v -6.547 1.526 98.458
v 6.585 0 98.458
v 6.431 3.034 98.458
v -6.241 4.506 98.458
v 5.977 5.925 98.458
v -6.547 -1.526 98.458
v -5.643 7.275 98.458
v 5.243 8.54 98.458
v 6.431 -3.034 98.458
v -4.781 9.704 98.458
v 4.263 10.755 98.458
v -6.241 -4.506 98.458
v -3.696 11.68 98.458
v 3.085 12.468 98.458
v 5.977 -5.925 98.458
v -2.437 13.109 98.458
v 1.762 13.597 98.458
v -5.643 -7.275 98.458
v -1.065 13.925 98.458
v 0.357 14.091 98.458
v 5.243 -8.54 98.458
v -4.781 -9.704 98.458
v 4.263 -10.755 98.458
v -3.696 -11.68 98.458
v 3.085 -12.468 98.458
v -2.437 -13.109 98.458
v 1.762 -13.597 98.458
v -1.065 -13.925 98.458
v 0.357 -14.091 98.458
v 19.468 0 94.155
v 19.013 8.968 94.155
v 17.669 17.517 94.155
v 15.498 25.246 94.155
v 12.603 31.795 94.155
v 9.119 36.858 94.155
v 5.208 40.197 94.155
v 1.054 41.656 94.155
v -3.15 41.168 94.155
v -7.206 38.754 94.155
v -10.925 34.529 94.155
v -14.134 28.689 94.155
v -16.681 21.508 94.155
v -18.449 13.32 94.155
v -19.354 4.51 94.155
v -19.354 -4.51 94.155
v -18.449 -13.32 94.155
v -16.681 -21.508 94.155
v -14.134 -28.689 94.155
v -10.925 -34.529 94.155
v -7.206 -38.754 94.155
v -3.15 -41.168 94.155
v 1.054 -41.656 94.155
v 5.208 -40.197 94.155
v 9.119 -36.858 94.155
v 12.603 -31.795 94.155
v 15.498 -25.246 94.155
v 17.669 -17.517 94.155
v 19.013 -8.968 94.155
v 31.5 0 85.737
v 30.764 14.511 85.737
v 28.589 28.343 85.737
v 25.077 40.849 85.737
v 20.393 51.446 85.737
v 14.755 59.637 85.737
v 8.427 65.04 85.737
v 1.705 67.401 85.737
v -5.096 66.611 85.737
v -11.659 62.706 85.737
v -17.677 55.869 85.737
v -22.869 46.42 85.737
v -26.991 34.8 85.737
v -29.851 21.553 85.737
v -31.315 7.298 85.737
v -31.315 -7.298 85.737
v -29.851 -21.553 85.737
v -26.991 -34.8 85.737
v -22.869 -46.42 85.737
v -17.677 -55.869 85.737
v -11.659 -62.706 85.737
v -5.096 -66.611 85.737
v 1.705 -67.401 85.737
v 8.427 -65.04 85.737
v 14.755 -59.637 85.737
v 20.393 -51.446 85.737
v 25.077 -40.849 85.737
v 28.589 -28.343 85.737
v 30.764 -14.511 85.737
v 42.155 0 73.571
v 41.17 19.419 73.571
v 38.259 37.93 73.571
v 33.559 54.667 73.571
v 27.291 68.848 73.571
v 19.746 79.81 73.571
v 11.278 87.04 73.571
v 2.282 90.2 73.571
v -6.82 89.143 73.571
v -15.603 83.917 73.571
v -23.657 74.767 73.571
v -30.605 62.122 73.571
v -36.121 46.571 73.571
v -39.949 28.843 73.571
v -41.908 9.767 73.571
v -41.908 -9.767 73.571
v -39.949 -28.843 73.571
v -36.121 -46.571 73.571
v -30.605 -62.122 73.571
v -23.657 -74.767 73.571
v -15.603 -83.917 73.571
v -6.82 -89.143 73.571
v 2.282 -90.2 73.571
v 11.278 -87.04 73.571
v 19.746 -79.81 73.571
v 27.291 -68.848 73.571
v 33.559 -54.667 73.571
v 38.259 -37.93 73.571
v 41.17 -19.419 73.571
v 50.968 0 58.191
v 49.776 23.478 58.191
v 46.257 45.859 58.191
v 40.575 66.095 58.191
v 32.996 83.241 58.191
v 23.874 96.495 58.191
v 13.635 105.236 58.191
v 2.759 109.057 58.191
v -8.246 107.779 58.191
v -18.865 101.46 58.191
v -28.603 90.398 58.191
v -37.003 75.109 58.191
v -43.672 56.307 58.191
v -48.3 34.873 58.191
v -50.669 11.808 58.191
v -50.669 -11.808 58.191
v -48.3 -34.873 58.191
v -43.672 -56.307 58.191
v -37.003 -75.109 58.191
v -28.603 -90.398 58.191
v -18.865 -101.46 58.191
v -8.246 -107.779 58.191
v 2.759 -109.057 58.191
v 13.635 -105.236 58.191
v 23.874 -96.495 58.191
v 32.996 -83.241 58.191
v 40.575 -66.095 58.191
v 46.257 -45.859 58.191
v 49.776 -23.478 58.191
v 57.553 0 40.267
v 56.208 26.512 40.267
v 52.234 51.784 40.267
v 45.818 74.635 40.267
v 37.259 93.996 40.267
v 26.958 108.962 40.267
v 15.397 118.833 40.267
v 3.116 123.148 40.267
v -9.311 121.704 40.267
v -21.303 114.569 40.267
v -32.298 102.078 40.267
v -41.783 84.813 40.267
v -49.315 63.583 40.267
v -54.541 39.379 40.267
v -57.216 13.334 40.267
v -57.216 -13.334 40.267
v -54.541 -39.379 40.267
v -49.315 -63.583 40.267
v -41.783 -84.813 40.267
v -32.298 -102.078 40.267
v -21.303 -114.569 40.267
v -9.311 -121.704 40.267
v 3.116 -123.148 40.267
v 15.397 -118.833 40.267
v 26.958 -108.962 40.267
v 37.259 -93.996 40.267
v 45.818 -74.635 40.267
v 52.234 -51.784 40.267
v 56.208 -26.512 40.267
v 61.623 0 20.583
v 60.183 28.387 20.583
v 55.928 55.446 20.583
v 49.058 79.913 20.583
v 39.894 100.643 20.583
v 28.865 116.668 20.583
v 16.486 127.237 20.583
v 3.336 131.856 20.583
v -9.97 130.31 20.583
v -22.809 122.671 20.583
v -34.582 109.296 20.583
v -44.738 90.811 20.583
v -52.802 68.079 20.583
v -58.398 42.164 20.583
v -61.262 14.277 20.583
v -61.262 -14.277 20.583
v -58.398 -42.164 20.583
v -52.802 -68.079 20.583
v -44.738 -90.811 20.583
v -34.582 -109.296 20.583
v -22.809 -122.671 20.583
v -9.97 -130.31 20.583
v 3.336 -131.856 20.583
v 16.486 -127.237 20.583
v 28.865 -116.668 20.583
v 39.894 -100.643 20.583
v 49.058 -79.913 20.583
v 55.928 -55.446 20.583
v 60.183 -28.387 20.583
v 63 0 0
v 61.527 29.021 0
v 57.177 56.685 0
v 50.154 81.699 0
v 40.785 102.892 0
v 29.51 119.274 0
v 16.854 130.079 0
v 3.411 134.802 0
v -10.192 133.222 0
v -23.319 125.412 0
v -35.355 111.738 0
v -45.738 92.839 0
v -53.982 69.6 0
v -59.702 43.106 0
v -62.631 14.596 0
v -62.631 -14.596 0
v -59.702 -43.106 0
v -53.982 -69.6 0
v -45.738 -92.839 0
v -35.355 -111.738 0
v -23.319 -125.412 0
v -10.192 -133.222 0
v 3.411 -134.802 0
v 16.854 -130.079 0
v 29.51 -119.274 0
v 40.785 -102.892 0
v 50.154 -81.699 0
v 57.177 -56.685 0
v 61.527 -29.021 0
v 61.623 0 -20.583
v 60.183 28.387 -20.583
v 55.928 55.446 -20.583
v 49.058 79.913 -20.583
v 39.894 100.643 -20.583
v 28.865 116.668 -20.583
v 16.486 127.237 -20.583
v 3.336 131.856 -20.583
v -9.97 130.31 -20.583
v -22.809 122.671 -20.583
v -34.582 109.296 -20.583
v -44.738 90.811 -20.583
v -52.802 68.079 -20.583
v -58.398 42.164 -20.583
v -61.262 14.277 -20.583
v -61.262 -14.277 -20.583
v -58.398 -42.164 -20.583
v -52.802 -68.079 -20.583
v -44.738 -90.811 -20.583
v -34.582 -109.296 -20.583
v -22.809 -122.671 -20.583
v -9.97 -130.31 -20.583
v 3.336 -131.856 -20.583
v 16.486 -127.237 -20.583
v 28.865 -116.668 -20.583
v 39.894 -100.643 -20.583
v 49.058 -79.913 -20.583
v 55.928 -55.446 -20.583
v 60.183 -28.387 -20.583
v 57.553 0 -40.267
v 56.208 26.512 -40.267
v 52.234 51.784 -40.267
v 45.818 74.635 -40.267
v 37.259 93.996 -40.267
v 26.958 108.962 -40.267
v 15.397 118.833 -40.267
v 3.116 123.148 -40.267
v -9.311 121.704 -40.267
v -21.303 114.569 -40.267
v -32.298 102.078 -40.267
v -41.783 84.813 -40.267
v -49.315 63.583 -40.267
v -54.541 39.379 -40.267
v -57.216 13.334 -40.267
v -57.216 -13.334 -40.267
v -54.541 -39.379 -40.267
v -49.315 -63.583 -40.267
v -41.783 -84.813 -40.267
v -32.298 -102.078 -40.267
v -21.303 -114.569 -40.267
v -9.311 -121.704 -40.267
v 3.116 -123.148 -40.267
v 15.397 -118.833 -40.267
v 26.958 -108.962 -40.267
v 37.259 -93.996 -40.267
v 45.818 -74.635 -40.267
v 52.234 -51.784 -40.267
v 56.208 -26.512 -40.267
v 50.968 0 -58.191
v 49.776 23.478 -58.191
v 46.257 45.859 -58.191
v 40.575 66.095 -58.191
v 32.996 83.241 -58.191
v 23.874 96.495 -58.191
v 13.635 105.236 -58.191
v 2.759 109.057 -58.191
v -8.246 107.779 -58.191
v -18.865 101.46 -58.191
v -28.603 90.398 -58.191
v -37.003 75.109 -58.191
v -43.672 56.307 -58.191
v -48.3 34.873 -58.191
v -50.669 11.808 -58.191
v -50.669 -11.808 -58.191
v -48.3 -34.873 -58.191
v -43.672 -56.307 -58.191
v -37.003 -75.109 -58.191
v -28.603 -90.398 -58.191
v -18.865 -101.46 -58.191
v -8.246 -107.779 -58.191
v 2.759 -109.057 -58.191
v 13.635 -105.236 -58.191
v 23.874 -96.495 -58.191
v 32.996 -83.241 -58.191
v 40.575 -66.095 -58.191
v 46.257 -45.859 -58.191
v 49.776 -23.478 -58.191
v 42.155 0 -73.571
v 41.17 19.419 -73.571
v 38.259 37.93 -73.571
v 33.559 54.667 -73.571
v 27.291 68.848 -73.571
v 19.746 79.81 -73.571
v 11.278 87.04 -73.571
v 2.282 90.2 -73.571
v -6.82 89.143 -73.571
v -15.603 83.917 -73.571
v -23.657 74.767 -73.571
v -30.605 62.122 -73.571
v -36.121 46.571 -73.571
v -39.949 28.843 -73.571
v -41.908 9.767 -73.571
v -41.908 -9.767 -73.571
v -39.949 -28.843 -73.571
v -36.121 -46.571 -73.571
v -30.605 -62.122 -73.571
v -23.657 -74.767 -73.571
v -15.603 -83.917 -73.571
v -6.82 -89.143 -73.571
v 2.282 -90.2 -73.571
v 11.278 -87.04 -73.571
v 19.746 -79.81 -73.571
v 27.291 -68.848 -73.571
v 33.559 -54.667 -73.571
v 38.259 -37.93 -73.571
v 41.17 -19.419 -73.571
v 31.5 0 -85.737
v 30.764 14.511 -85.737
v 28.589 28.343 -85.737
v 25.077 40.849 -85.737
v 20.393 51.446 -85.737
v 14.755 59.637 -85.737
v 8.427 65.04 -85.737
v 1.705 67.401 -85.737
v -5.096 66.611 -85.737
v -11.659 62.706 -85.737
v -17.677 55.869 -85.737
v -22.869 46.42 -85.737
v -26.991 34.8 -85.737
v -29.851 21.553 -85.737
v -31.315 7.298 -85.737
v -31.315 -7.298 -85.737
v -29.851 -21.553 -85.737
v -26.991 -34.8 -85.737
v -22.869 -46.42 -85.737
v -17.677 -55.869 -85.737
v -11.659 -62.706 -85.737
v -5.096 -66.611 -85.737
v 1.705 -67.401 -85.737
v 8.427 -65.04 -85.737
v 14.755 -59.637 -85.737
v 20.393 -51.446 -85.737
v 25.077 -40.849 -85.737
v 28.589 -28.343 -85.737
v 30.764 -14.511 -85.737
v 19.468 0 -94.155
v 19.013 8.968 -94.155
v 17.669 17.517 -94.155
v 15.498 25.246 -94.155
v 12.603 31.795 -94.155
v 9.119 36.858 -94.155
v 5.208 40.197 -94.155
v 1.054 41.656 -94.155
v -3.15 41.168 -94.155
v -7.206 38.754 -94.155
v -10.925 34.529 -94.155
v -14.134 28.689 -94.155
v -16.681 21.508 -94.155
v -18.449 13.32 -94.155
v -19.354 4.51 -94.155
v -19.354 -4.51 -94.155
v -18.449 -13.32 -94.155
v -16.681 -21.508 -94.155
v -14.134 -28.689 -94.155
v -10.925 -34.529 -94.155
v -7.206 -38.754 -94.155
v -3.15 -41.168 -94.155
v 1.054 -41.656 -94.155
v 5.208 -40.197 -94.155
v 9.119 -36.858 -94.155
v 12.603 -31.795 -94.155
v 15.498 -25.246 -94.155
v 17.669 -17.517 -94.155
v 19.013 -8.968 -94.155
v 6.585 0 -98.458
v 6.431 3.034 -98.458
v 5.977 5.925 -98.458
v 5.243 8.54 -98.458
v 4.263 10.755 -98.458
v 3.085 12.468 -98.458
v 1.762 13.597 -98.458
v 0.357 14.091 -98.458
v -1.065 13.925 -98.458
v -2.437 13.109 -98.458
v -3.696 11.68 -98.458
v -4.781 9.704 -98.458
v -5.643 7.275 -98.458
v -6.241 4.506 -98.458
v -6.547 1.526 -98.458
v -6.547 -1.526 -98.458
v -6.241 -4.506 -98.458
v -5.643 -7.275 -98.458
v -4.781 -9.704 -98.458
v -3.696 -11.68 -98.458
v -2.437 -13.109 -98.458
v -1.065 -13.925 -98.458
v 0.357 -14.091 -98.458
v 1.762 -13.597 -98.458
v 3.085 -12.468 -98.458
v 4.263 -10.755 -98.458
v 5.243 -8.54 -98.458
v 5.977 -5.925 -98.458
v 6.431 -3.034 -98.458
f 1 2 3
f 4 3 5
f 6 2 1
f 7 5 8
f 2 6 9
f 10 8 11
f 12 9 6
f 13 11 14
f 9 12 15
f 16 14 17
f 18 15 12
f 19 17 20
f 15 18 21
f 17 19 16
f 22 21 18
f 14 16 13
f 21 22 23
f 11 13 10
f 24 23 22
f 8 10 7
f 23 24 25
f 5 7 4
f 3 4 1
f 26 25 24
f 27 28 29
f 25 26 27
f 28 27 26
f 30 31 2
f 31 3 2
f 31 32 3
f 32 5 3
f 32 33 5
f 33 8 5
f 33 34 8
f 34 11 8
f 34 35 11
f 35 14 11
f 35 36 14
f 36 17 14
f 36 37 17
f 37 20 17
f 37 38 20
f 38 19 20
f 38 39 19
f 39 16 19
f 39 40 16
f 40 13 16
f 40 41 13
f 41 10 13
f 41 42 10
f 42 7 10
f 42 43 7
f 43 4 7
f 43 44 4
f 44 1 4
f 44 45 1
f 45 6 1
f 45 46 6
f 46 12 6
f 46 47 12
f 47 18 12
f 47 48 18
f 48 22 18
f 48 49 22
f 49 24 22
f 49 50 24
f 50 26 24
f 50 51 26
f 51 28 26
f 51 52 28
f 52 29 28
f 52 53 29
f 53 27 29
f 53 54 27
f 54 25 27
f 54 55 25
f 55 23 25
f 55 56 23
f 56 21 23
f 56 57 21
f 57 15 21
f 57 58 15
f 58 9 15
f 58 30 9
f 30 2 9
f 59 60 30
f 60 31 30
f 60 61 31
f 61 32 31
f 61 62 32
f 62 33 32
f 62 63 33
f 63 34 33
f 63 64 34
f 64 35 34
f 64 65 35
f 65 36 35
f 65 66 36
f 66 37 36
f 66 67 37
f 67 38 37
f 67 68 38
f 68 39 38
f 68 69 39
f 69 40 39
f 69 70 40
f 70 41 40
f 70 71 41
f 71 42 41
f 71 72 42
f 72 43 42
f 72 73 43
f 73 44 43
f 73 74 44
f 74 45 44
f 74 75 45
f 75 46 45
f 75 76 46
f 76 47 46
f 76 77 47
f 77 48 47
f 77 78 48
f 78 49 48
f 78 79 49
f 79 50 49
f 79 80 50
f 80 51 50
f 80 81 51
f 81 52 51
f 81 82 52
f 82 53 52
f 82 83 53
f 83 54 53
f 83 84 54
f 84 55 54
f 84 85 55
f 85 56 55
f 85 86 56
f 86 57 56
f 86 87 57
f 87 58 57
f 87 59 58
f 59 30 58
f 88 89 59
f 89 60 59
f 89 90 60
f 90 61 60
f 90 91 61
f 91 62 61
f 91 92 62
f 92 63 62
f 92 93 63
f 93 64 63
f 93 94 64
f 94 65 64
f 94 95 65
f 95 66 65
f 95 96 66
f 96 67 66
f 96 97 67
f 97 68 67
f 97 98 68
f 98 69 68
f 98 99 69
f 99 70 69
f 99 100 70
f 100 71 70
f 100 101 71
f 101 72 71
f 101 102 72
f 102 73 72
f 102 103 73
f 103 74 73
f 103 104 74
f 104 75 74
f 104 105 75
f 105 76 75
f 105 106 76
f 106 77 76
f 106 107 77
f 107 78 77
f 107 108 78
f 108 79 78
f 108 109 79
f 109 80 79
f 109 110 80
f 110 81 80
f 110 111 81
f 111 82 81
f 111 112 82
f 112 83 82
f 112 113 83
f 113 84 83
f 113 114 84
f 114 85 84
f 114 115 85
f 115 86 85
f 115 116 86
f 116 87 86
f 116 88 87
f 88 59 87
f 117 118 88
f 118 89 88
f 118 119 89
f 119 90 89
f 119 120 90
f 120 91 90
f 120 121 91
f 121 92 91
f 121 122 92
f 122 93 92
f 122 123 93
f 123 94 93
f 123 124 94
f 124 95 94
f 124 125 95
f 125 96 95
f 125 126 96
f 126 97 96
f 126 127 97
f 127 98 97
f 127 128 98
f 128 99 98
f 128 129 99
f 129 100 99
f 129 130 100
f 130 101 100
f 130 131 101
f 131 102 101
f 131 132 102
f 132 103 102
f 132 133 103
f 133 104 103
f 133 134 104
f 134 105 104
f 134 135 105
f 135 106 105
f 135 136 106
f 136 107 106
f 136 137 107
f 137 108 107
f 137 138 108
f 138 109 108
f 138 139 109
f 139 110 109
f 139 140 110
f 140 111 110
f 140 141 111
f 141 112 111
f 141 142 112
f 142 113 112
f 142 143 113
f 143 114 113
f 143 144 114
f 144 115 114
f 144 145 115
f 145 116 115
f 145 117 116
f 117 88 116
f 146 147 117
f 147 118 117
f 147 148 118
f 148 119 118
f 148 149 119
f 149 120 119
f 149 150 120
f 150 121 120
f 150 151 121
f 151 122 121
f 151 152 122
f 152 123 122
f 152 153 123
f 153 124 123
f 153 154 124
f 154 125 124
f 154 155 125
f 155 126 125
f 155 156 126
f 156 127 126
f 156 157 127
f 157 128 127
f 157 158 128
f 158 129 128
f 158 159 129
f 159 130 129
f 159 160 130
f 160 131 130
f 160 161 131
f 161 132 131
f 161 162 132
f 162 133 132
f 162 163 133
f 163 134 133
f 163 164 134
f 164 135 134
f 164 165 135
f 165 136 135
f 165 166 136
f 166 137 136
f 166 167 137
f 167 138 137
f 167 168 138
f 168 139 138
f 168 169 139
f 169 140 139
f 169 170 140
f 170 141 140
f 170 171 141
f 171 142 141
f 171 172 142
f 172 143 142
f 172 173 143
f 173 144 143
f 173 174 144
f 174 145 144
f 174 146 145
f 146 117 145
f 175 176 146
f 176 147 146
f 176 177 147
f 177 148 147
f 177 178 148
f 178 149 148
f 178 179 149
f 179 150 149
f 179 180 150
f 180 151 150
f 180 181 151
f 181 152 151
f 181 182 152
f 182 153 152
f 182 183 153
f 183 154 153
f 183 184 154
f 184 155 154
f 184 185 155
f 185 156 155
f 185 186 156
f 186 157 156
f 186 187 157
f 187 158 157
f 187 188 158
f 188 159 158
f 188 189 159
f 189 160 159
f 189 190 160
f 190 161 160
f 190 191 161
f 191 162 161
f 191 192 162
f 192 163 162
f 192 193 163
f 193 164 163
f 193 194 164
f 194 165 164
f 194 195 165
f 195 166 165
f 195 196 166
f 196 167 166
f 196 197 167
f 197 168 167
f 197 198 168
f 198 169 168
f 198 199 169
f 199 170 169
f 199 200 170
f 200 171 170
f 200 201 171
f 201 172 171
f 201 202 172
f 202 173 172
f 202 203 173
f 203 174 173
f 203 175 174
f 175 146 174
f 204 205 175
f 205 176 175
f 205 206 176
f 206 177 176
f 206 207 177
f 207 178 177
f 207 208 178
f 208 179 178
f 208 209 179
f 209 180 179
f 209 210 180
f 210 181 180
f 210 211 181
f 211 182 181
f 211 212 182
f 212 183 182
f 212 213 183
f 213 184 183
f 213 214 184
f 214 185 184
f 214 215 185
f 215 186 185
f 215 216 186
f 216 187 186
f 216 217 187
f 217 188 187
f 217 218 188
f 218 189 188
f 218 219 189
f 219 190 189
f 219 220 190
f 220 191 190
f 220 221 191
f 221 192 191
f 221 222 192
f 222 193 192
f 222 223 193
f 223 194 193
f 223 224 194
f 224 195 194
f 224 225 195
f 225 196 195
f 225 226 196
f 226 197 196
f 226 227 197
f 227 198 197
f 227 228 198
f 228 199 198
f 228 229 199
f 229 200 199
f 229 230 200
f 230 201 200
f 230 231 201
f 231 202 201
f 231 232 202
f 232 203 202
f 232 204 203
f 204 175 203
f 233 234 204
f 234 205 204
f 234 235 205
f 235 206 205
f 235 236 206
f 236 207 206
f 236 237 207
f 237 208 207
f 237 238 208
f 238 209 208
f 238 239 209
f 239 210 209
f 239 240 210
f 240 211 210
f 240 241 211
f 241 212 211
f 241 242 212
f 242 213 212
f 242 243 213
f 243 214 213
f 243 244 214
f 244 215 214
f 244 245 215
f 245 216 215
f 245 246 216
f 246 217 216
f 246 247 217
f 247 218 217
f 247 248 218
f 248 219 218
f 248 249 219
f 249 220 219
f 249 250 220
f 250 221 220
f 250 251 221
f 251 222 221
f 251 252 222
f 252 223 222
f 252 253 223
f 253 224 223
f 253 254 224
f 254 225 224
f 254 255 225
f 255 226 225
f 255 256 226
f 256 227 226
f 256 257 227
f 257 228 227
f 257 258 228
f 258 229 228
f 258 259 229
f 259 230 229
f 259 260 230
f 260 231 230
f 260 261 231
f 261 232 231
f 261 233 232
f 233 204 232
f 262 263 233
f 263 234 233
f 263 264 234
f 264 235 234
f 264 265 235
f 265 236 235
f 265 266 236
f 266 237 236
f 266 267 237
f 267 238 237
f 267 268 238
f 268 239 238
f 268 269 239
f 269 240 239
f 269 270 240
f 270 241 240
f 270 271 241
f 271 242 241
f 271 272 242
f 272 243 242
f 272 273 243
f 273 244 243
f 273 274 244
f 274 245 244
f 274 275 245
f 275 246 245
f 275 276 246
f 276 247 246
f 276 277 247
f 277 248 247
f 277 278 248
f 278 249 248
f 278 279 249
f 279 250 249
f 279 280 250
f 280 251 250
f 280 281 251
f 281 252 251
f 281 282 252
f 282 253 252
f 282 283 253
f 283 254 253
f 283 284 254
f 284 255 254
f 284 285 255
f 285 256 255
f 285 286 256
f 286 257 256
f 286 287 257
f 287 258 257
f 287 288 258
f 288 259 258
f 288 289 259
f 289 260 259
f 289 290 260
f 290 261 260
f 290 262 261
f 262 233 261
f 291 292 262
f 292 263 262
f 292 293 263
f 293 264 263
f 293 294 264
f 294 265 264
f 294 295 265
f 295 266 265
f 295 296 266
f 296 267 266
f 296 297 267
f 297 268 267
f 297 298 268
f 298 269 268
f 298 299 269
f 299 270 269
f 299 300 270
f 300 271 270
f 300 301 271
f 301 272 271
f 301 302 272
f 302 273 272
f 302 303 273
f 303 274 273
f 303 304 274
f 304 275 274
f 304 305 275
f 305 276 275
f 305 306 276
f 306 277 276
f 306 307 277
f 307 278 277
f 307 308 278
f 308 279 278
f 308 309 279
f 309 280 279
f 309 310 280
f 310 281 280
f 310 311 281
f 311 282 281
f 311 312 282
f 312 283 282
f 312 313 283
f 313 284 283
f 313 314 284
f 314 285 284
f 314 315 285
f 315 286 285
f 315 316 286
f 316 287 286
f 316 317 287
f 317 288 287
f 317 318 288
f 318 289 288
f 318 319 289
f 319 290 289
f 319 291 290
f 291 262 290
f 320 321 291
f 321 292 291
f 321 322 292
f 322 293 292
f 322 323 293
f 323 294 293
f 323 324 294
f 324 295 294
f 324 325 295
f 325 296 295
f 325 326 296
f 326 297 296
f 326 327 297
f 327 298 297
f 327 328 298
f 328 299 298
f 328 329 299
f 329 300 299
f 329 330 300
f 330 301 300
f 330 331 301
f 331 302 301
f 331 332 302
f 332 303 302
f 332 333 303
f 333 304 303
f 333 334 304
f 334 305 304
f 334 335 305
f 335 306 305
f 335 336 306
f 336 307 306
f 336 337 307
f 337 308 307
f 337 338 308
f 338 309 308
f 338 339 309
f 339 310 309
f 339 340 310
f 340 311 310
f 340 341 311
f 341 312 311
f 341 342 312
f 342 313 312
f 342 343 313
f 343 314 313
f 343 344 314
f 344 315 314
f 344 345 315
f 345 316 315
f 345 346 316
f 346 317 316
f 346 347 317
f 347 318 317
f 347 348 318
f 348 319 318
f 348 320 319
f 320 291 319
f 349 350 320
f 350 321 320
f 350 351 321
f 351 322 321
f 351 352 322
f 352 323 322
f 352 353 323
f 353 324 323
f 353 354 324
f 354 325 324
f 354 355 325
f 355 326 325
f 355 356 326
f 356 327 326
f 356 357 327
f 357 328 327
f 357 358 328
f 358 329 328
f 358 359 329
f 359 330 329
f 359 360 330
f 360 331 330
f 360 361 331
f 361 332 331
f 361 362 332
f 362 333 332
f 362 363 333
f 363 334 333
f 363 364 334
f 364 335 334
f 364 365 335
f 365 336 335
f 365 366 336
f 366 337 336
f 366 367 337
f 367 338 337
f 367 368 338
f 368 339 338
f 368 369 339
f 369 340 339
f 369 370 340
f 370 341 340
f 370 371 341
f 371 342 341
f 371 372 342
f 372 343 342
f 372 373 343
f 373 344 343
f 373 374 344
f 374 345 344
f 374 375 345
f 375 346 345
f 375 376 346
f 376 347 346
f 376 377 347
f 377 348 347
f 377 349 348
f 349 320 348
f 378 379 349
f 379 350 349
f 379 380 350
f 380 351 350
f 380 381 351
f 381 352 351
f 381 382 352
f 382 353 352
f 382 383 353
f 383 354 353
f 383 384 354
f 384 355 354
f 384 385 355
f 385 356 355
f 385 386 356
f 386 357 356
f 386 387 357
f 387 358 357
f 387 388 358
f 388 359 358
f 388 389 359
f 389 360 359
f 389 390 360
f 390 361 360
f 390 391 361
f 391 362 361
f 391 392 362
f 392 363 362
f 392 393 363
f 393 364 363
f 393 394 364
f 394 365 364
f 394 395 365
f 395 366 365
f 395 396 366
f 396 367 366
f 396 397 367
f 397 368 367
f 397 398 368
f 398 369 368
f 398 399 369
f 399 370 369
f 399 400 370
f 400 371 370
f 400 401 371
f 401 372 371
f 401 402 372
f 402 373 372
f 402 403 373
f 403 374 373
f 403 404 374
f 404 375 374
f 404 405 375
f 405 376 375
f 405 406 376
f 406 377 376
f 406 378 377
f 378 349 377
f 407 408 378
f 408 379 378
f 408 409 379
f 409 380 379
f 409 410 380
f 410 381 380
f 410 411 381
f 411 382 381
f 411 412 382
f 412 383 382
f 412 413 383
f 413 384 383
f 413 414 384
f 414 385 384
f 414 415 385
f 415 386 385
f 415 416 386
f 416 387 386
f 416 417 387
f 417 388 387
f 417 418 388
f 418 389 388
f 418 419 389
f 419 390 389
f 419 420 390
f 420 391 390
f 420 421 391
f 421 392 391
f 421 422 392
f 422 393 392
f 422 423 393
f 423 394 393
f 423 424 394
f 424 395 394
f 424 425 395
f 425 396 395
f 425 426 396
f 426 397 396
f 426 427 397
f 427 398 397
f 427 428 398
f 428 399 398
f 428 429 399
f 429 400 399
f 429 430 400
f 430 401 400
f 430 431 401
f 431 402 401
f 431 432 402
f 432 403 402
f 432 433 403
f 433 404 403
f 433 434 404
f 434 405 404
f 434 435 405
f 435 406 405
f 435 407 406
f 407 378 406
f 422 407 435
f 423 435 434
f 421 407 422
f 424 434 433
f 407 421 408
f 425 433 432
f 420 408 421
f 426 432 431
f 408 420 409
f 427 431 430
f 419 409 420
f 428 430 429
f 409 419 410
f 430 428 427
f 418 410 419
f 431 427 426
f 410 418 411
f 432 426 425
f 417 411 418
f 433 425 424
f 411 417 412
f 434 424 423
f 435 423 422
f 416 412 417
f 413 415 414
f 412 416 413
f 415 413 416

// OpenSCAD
// Generated by SolidPython 1.0.1 on 2020-07-29 00:46:48


scale(v = [7, 15, 11]) {
	sphere(r = 9);
}
/***********************************************
*********      SolidPython code:      **********
************************************************
 
# import packages: SolidPython
from solid import *
from solid.utils import *
from itertools import chain, combinations, permutations


class Resize:

    def __init__(self, scad_file):
        self.scad_file = scad_file
        #self.scad_file = import_scad(scad_file)
        # cone/cylinder param:
        self.r1 = 0
        self.r2 = 0
        self.h = 0
        # rectangular prism param:
        self.w = 0
        self.l = 0
        # ellipse param:
        self.r = 0

    # import OpenScad code (file name corresponds to shape)


    # classify shape + parameters
    def assign(self, param1, param2, param3):
        if self.scad_file == 'cone.scad':
            self.r1 = param1
            self.r2 = param2
            self.h = param3
        elif self.scad_file == 'cylinder.scad':
            self.r1 = param1
            self.r2 = param2
            self.h = param3
        elif self.scad_file == 'rectangularPrism.scad':
            self.h = param1
            self.l = param2
            self.w = param3
        else:
            self.r = param1
            self.h = param2

    # resize parameters
    def iterate(self):
        x = range(3, 20, 2)
        i = 1
        if self.scad_file == 'cone.scad':
            tempList = list(permutations(x, 2))
            for temp in tempList:
                param1 = temp[0]
                param2 = temp[1]
                filepath = 'produced_scad_files/' + 'cone' + str(param1) + '_' + str(param2) + '_' + '.scad'
                scad_render_to_file(cylinder(h=param1, r1=param2, r2=0), filepath)

        elif self.scad_file == 'cylinder.scad':
            tempList = list(permutations(x, 3))
            for temp in tempList:
                param1 = temp[0]
                param2 = temp[1]
                filepath = 'produced_scad_files/' + 'cylinder' + str(param1) + '_' + str(param2) + '_' + '.scad'
                scad_render_to_file(cylinder(h=param1, r1=param2, r2=param2), filepath)

        elif self.scad_file == 'rectangularPrism.scad':
            tempList = list(permutations(x, 3))
            for temp in tempList:
                param1 = temp[0]
                param2 = temp[1]
                param3 = temp[2]
                filepath = 'produced_scad_files/' + 'rectangularPrism' + str(param1) + '_' + str(param2) + '_' + str(
                    param3) + '.scad'
                scad_render_to_file(cube(size=(param1, param2, param3)), filepath)

        elif self.scad_file == 'ellipse.scad':
            tempList = list(permutations(x, 4))
            for temp in tempList:
                param1 = temp[0]
                param2 = temp[1]
                param3 = temp[2]
                param4 = temp[3]
                filepath = 'produced_scad_files/' + 'ellipse' + str(param1) + '_' + str(param2) + '_' + str(param3) + '_' + str(param4) + '.scad'
                scad_render_to_file(scale([param1, param2, param3])(sphere(r=param4)), filepath)

    def render_to_scadfile(self):
        scad_render_to_file(scad, 'example.scad') 
 
************************************************/
